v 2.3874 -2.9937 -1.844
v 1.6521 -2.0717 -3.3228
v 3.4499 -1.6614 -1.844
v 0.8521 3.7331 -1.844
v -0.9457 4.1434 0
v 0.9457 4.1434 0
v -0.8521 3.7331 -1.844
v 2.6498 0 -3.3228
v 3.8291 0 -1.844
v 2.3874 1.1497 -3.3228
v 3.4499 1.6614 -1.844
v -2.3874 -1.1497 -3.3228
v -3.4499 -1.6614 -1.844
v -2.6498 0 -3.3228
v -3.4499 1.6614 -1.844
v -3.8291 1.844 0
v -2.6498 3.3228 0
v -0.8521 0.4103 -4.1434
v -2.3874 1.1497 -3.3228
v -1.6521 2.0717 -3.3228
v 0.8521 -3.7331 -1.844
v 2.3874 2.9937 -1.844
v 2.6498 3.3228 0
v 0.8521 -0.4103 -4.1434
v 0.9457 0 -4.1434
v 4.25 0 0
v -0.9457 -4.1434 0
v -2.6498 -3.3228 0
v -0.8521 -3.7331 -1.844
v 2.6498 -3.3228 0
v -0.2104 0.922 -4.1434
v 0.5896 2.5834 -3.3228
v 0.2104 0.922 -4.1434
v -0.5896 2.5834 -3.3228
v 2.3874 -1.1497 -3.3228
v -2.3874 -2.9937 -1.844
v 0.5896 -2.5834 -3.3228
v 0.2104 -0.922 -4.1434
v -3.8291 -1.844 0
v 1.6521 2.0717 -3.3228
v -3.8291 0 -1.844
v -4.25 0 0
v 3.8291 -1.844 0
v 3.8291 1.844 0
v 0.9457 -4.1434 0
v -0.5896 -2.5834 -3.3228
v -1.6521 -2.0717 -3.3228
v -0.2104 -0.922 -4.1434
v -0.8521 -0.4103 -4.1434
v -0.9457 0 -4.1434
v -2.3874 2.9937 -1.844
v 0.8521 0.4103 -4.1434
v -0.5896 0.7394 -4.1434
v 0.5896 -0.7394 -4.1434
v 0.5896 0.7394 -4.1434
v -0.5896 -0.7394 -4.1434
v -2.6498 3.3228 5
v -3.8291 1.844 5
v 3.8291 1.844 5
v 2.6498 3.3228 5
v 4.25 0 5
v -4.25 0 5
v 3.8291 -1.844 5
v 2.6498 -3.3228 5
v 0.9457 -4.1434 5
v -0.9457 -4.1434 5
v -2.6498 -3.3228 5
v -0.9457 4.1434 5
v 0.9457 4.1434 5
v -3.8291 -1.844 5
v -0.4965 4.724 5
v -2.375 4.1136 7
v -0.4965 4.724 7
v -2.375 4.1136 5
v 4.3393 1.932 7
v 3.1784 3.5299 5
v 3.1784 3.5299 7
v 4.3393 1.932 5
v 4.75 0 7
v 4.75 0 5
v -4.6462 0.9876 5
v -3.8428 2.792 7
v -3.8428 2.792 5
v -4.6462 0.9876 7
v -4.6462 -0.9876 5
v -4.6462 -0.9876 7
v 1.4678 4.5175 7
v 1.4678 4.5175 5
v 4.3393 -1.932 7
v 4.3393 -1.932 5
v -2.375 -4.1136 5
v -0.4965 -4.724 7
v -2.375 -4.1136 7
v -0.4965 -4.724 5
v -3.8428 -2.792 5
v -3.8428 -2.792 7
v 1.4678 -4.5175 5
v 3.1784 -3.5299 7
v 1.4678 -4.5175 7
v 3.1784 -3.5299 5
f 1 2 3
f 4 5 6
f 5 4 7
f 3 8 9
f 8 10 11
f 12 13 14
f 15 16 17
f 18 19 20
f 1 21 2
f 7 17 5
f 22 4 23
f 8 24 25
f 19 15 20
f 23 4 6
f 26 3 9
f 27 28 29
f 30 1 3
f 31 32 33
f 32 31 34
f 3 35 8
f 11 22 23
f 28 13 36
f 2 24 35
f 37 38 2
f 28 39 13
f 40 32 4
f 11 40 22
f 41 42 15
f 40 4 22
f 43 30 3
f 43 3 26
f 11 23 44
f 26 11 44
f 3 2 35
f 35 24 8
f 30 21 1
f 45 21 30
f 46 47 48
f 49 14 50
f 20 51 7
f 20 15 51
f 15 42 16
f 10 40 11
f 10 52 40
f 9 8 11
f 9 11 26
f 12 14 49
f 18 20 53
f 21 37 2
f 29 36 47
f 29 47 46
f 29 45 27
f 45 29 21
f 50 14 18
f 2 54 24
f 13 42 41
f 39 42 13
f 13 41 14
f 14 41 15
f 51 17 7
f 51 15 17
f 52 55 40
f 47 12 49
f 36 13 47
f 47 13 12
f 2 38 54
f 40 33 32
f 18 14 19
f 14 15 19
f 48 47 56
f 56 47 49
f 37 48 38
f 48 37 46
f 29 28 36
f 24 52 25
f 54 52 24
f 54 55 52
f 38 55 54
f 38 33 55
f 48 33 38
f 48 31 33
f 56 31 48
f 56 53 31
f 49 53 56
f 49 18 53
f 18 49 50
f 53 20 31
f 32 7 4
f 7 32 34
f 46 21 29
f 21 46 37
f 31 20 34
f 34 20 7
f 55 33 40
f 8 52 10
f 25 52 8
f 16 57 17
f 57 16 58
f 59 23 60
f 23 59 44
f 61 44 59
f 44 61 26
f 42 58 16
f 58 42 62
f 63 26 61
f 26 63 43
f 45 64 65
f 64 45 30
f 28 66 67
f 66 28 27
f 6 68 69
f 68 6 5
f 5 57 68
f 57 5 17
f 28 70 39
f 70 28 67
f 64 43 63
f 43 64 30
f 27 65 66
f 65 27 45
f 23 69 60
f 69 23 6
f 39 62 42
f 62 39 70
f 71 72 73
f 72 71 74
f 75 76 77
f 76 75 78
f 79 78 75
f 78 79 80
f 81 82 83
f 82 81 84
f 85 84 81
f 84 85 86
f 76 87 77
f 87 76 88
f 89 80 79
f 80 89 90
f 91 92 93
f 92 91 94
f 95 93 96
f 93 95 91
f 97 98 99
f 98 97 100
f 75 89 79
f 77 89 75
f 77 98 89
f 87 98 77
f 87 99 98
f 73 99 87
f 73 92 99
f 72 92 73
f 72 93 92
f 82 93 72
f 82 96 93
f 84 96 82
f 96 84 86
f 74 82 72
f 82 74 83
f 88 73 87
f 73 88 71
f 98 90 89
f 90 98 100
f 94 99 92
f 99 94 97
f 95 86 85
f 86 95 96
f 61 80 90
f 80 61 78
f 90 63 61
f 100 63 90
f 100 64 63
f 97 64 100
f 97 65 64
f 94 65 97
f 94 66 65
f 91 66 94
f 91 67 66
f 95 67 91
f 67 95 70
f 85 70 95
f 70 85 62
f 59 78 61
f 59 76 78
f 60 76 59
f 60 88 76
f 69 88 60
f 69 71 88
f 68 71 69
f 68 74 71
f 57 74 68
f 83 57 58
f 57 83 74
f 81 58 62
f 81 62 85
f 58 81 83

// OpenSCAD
module rgb_led(body_diameter) {
  sphere(d=body_diameter);
  cylinder(5.5,body_diameter/2,body_diameter/2);
  translate([0,0,5]) {
    cylinder(2,9.5/2,(body_diameter+1)/2);
  }
}

rgb_led(8.5);
